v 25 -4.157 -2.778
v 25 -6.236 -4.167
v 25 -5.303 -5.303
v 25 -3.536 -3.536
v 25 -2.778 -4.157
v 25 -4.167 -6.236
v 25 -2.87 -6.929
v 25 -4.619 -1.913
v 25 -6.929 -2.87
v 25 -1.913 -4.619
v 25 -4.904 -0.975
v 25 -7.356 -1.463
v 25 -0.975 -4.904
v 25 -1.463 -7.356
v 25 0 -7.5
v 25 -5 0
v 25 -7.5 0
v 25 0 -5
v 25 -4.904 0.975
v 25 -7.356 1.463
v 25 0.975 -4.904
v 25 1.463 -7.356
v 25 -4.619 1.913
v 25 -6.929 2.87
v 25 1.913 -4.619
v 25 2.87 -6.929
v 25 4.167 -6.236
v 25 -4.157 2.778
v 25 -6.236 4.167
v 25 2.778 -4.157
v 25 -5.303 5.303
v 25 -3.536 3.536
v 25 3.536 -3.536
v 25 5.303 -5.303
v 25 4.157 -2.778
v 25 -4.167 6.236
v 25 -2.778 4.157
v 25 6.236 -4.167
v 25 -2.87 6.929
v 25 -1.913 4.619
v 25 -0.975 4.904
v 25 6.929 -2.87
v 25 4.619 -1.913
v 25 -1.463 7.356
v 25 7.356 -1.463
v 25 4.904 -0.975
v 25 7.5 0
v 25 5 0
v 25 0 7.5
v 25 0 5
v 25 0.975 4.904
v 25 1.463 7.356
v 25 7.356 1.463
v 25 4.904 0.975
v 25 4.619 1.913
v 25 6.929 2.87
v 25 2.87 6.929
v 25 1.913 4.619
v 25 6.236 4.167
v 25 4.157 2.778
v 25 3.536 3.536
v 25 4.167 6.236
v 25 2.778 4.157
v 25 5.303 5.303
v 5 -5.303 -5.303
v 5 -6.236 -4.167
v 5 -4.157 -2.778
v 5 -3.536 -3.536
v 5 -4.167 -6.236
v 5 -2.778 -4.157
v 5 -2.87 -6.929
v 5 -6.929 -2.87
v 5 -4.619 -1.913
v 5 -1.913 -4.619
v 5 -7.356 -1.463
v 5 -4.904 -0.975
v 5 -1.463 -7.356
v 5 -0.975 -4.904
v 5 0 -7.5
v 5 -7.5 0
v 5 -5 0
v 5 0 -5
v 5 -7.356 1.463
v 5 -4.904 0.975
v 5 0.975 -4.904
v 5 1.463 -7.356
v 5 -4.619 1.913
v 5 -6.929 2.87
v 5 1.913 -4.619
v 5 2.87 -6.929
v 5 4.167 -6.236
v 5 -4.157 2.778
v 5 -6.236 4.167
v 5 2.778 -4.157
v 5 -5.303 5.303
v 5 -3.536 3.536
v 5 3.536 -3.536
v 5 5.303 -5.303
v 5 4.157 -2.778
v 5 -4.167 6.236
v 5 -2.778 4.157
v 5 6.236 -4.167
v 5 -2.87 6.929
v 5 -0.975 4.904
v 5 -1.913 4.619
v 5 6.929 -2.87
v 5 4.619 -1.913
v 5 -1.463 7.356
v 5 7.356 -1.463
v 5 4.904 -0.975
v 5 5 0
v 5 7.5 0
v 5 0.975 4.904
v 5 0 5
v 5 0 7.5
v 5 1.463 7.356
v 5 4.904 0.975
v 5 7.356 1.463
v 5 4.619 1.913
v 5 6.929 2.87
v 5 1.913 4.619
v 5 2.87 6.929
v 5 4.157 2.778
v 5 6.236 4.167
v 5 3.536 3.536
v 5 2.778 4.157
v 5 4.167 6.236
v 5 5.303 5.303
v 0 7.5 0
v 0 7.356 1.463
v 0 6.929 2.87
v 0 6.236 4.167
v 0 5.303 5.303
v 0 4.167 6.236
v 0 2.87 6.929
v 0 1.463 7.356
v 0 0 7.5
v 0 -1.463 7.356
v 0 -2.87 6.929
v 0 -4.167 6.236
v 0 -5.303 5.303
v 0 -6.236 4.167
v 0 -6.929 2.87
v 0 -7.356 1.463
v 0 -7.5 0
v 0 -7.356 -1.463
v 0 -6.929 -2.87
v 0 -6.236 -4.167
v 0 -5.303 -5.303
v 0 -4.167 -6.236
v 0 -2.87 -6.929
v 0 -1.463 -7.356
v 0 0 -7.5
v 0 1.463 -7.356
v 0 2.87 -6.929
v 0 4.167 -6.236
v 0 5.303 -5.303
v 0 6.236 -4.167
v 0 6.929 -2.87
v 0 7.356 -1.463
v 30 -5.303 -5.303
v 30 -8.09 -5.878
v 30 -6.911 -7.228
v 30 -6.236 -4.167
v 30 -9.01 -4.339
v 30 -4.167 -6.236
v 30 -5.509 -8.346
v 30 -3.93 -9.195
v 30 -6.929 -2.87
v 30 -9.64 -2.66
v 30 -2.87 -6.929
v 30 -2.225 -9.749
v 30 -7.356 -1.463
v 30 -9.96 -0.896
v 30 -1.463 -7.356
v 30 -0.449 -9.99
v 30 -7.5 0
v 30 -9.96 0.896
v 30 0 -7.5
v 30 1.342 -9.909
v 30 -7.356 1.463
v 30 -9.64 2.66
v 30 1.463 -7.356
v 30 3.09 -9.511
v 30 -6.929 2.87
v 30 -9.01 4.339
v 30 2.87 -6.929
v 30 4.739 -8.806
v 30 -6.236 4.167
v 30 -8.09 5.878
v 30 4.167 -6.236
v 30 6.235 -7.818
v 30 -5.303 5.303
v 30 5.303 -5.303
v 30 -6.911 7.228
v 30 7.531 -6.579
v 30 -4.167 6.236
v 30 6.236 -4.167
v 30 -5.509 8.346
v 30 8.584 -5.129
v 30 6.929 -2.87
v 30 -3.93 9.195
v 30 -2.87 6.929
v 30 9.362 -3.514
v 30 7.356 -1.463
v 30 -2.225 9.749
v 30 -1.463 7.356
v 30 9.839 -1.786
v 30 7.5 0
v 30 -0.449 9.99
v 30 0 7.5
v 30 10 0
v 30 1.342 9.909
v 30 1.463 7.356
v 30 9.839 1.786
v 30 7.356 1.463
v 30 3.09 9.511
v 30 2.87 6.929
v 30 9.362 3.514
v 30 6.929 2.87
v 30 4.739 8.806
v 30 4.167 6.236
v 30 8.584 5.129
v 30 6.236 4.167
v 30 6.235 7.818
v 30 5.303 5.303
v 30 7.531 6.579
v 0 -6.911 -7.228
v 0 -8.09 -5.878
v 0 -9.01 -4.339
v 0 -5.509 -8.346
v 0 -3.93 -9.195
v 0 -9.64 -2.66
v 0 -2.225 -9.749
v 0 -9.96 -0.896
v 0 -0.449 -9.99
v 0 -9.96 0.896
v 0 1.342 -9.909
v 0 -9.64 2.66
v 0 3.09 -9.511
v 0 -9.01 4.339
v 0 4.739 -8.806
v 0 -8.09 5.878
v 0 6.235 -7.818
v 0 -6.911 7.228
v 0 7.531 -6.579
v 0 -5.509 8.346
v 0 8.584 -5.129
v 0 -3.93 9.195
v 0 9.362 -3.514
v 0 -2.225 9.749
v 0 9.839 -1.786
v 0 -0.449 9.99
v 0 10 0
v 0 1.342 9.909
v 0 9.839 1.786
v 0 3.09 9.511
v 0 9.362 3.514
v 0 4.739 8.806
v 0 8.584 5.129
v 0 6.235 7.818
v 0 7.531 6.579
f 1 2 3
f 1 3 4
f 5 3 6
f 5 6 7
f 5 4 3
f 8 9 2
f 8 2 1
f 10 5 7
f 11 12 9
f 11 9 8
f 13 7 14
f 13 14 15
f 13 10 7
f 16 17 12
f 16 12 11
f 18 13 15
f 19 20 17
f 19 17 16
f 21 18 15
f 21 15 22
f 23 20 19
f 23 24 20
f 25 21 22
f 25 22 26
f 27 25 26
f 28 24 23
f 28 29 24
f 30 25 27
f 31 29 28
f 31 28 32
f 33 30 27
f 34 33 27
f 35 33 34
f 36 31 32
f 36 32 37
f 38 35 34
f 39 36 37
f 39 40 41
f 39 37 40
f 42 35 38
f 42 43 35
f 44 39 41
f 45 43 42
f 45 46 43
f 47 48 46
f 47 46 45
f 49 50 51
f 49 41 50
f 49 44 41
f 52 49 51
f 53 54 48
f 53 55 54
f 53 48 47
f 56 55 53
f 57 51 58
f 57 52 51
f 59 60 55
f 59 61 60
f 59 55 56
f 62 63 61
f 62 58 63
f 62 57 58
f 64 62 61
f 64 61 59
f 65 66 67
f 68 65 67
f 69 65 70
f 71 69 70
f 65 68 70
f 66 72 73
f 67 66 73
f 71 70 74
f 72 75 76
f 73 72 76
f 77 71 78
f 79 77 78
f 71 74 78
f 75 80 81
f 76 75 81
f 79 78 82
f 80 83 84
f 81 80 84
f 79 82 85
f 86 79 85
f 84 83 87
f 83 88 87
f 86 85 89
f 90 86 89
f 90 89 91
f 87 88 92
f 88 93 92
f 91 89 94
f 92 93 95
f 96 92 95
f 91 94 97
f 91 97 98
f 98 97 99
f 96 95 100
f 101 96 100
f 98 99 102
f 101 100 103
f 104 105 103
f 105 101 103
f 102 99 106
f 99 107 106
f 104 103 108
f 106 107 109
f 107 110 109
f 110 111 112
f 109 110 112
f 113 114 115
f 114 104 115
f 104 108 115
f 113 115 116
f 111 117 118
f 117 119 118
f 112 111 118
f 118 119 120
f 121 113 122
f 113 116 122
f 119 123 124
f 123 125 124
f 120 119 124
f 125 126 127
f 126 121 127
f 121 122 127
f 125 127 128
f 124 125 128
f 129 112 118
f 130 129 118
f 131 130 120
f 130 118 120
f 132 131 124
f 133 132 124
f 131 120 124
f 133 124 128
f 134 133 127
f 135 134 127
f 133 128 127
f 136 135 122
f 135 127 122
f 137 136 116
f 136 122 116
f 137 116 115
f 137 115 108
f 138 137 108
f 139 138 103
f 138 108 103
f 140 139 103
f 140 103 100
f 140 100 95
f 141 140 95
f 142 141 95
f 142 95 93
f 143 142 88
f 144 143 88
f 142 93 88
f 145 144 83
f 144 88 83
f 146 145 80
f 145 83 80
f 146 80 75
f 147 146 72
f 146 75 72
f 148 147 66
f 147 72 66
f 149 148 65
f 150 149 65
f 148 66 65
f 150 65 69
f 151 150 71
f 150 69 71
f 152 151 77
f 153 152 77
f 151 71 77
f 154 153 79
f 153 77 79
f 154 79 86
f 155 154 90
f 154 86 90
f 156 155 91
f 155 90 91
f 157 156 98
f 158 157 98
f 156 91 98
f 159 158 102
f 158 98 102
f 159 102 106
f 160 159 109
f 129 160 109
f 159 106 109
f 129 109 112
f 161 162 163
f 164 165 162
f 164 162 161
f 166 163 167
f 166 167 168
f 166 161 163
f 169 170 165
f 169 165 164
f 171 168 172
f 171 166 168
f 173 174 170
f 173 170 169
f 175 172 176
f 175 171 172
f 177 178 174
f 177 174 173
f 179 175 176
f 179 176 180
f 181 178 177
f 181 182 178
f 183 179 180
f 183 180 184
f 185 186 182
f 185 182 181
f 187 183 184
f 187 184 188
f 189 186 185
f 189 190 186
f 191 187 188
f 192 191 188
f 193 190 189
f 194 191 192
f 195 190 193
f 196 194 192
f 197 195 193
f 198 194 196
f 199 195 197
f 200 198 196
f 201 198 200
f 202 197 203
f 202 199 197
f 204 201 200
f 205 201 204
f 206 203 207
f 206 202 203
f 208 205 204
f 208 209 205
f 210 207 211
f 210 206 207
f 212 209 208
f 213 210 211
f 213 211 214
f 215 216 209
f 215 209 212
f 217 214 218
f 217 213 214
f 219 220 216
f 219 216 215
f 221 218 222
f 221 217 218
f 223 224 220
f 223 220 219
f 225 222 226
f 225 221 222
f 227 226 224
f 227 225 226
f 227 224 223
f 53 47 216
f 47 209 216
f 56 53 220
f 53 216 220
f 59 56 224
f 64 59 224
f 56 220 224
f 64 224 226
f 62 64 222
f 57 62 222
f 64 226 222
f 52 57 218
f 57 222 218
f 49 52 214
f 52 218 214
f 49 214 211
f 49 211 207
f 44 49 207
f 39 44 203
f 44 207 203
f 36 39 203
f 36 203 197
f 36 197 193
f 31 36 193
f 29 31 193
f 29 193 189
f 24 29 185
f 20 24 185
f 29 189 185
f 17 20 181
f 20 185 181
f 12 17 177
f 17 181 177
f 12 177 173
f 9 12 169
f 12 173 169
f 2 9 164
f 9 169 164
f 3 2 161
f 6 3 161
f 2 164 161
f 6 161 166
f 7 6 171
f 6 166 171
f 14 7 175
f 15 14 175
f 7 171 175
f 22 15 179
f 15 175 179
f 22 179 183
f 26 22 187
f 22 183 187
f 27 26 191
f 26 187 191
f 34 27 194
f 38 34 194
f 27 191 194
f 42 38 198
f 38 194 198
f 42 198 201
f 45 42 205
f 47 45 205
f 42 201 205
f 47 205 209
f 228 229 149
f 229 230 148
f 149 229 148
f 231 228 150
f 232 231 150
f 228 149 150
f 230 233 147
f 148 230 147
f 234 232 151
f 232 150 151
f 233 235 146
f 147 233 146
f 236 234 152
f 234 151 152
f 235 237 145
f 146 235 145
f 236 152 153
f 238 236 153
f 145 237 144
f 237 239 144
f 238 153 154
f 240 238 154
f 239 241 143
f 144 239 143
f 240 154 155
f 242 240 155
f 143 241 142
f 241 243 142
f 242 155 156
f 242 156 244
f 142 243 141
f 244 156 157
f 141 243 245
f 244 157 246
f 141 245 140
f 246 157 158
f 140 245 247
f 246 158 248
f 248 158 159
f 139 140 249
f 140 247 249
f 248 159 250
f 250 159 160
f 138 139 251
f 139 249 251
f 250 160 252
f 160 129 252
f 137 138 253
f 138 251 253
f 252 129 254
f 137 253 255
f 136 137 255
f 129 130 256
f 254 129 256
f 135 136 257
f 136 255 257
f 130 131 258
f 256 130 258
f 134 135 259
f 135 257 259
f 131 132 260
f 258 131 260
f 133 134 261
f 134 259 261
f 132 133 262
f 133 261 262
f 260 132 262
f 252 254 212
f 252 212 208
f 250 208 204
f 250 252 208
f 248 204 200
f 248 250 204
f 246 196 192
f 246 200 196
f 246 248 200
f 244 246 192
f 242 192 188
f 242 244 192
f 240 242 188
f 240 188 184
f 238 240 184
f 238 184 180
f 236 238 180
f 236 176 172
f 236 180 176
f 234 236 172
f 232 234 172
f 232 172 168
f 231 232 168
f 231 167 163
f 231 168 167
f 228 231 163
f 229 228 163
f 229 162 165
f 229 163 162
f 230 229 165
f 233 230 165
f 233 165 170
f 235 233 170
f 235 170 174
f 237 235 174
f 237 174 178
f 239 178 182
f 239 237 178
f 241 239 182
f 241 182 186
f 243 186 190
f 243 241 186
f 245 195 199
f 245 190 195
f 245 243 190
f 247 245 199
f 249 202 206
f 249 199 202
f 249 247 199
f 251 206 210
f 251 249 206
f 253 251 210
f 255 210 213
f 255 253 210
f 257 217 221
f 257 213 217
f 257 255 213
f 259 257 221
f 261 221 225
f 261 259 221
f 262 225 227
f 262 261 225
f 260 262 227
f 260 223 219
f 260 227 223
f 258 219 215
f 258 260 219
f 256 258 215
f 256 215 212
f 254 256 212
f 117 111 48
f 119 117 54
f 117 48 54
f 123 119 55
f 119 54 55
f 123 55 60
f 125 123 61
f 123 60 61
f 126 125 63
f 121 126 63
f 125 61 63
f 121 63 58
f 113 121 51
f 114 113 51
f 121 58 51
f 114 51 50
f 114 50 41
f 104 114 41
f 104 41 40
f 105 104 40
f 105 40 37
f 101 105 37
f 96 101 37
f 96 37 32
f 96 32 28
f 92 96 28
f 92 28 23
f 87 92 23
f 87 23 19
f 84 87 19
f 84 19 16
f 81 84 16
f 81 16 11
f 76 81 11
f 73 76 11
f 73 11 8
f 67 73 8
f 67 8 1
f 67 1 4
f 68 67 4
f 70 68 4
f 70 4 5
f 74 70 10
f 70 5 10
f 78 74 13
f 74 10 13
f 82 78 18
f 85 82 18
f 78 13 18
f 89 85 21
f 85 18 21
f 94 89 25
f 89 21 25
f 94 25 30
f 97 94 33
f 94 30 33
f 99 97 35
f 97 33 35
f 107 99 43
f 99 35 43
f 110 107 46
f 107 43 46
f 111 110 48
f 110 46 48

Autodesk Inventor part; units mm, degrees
sketch "Sketch_1" plane through (0, 0, 0) normal (0, 0, 1) x (1, 0, 0)
  line L0 (30, 0) -> (0, 0)
  line L1 (0, 7.5) -> (5, 7.5)
  line L2 (5, 7.5) -> (5, 5)
  line L3 (5, 5) -> (25, 5)
  line L4 (25, 5) -> (25, 7.5)
  line L5 (25, 7.5) -> (30, 7.5)
  line L6 (30, 7.5) -> (30, 10)
  line L7 (30, 10) -> (0, 10)
  line L8 (0, 10) -> (0, 7.5)
revolve "Revolution1" add sketch "Sketch_1" angle 360 about axis through (30, 0, 0) along (1, 0, 0)
ref_plane "body_to_B_L__XY" through (0, 0, 0) normal (1, 0, 0) x (0, 0, -1)
ref_plane "body_to_B_L__YZ" through (0, 0, 0) normal (0, 0, -1) x (0, 1, 0)
ref_plane "body_to_B_L__ZX" through (0, 0, 0) normal (0, 1, 0) x (1, 0, 0)
ref_plane "body_to_B_R__XY" through (25, 0, 0) normal (-1, 0, 0) x (0, 0, -1)
ref_plane "body_to_B_R__YZ" through (25, 0, 0) normal (0, 0, -1) x (0, -1, 0)
ref_plane "body_to_B_R__ZX" through (25, 0, 0) normal (0, -1, 0) x (-1, 0, 0)
properties part number "RORPOS20-L30_1"
